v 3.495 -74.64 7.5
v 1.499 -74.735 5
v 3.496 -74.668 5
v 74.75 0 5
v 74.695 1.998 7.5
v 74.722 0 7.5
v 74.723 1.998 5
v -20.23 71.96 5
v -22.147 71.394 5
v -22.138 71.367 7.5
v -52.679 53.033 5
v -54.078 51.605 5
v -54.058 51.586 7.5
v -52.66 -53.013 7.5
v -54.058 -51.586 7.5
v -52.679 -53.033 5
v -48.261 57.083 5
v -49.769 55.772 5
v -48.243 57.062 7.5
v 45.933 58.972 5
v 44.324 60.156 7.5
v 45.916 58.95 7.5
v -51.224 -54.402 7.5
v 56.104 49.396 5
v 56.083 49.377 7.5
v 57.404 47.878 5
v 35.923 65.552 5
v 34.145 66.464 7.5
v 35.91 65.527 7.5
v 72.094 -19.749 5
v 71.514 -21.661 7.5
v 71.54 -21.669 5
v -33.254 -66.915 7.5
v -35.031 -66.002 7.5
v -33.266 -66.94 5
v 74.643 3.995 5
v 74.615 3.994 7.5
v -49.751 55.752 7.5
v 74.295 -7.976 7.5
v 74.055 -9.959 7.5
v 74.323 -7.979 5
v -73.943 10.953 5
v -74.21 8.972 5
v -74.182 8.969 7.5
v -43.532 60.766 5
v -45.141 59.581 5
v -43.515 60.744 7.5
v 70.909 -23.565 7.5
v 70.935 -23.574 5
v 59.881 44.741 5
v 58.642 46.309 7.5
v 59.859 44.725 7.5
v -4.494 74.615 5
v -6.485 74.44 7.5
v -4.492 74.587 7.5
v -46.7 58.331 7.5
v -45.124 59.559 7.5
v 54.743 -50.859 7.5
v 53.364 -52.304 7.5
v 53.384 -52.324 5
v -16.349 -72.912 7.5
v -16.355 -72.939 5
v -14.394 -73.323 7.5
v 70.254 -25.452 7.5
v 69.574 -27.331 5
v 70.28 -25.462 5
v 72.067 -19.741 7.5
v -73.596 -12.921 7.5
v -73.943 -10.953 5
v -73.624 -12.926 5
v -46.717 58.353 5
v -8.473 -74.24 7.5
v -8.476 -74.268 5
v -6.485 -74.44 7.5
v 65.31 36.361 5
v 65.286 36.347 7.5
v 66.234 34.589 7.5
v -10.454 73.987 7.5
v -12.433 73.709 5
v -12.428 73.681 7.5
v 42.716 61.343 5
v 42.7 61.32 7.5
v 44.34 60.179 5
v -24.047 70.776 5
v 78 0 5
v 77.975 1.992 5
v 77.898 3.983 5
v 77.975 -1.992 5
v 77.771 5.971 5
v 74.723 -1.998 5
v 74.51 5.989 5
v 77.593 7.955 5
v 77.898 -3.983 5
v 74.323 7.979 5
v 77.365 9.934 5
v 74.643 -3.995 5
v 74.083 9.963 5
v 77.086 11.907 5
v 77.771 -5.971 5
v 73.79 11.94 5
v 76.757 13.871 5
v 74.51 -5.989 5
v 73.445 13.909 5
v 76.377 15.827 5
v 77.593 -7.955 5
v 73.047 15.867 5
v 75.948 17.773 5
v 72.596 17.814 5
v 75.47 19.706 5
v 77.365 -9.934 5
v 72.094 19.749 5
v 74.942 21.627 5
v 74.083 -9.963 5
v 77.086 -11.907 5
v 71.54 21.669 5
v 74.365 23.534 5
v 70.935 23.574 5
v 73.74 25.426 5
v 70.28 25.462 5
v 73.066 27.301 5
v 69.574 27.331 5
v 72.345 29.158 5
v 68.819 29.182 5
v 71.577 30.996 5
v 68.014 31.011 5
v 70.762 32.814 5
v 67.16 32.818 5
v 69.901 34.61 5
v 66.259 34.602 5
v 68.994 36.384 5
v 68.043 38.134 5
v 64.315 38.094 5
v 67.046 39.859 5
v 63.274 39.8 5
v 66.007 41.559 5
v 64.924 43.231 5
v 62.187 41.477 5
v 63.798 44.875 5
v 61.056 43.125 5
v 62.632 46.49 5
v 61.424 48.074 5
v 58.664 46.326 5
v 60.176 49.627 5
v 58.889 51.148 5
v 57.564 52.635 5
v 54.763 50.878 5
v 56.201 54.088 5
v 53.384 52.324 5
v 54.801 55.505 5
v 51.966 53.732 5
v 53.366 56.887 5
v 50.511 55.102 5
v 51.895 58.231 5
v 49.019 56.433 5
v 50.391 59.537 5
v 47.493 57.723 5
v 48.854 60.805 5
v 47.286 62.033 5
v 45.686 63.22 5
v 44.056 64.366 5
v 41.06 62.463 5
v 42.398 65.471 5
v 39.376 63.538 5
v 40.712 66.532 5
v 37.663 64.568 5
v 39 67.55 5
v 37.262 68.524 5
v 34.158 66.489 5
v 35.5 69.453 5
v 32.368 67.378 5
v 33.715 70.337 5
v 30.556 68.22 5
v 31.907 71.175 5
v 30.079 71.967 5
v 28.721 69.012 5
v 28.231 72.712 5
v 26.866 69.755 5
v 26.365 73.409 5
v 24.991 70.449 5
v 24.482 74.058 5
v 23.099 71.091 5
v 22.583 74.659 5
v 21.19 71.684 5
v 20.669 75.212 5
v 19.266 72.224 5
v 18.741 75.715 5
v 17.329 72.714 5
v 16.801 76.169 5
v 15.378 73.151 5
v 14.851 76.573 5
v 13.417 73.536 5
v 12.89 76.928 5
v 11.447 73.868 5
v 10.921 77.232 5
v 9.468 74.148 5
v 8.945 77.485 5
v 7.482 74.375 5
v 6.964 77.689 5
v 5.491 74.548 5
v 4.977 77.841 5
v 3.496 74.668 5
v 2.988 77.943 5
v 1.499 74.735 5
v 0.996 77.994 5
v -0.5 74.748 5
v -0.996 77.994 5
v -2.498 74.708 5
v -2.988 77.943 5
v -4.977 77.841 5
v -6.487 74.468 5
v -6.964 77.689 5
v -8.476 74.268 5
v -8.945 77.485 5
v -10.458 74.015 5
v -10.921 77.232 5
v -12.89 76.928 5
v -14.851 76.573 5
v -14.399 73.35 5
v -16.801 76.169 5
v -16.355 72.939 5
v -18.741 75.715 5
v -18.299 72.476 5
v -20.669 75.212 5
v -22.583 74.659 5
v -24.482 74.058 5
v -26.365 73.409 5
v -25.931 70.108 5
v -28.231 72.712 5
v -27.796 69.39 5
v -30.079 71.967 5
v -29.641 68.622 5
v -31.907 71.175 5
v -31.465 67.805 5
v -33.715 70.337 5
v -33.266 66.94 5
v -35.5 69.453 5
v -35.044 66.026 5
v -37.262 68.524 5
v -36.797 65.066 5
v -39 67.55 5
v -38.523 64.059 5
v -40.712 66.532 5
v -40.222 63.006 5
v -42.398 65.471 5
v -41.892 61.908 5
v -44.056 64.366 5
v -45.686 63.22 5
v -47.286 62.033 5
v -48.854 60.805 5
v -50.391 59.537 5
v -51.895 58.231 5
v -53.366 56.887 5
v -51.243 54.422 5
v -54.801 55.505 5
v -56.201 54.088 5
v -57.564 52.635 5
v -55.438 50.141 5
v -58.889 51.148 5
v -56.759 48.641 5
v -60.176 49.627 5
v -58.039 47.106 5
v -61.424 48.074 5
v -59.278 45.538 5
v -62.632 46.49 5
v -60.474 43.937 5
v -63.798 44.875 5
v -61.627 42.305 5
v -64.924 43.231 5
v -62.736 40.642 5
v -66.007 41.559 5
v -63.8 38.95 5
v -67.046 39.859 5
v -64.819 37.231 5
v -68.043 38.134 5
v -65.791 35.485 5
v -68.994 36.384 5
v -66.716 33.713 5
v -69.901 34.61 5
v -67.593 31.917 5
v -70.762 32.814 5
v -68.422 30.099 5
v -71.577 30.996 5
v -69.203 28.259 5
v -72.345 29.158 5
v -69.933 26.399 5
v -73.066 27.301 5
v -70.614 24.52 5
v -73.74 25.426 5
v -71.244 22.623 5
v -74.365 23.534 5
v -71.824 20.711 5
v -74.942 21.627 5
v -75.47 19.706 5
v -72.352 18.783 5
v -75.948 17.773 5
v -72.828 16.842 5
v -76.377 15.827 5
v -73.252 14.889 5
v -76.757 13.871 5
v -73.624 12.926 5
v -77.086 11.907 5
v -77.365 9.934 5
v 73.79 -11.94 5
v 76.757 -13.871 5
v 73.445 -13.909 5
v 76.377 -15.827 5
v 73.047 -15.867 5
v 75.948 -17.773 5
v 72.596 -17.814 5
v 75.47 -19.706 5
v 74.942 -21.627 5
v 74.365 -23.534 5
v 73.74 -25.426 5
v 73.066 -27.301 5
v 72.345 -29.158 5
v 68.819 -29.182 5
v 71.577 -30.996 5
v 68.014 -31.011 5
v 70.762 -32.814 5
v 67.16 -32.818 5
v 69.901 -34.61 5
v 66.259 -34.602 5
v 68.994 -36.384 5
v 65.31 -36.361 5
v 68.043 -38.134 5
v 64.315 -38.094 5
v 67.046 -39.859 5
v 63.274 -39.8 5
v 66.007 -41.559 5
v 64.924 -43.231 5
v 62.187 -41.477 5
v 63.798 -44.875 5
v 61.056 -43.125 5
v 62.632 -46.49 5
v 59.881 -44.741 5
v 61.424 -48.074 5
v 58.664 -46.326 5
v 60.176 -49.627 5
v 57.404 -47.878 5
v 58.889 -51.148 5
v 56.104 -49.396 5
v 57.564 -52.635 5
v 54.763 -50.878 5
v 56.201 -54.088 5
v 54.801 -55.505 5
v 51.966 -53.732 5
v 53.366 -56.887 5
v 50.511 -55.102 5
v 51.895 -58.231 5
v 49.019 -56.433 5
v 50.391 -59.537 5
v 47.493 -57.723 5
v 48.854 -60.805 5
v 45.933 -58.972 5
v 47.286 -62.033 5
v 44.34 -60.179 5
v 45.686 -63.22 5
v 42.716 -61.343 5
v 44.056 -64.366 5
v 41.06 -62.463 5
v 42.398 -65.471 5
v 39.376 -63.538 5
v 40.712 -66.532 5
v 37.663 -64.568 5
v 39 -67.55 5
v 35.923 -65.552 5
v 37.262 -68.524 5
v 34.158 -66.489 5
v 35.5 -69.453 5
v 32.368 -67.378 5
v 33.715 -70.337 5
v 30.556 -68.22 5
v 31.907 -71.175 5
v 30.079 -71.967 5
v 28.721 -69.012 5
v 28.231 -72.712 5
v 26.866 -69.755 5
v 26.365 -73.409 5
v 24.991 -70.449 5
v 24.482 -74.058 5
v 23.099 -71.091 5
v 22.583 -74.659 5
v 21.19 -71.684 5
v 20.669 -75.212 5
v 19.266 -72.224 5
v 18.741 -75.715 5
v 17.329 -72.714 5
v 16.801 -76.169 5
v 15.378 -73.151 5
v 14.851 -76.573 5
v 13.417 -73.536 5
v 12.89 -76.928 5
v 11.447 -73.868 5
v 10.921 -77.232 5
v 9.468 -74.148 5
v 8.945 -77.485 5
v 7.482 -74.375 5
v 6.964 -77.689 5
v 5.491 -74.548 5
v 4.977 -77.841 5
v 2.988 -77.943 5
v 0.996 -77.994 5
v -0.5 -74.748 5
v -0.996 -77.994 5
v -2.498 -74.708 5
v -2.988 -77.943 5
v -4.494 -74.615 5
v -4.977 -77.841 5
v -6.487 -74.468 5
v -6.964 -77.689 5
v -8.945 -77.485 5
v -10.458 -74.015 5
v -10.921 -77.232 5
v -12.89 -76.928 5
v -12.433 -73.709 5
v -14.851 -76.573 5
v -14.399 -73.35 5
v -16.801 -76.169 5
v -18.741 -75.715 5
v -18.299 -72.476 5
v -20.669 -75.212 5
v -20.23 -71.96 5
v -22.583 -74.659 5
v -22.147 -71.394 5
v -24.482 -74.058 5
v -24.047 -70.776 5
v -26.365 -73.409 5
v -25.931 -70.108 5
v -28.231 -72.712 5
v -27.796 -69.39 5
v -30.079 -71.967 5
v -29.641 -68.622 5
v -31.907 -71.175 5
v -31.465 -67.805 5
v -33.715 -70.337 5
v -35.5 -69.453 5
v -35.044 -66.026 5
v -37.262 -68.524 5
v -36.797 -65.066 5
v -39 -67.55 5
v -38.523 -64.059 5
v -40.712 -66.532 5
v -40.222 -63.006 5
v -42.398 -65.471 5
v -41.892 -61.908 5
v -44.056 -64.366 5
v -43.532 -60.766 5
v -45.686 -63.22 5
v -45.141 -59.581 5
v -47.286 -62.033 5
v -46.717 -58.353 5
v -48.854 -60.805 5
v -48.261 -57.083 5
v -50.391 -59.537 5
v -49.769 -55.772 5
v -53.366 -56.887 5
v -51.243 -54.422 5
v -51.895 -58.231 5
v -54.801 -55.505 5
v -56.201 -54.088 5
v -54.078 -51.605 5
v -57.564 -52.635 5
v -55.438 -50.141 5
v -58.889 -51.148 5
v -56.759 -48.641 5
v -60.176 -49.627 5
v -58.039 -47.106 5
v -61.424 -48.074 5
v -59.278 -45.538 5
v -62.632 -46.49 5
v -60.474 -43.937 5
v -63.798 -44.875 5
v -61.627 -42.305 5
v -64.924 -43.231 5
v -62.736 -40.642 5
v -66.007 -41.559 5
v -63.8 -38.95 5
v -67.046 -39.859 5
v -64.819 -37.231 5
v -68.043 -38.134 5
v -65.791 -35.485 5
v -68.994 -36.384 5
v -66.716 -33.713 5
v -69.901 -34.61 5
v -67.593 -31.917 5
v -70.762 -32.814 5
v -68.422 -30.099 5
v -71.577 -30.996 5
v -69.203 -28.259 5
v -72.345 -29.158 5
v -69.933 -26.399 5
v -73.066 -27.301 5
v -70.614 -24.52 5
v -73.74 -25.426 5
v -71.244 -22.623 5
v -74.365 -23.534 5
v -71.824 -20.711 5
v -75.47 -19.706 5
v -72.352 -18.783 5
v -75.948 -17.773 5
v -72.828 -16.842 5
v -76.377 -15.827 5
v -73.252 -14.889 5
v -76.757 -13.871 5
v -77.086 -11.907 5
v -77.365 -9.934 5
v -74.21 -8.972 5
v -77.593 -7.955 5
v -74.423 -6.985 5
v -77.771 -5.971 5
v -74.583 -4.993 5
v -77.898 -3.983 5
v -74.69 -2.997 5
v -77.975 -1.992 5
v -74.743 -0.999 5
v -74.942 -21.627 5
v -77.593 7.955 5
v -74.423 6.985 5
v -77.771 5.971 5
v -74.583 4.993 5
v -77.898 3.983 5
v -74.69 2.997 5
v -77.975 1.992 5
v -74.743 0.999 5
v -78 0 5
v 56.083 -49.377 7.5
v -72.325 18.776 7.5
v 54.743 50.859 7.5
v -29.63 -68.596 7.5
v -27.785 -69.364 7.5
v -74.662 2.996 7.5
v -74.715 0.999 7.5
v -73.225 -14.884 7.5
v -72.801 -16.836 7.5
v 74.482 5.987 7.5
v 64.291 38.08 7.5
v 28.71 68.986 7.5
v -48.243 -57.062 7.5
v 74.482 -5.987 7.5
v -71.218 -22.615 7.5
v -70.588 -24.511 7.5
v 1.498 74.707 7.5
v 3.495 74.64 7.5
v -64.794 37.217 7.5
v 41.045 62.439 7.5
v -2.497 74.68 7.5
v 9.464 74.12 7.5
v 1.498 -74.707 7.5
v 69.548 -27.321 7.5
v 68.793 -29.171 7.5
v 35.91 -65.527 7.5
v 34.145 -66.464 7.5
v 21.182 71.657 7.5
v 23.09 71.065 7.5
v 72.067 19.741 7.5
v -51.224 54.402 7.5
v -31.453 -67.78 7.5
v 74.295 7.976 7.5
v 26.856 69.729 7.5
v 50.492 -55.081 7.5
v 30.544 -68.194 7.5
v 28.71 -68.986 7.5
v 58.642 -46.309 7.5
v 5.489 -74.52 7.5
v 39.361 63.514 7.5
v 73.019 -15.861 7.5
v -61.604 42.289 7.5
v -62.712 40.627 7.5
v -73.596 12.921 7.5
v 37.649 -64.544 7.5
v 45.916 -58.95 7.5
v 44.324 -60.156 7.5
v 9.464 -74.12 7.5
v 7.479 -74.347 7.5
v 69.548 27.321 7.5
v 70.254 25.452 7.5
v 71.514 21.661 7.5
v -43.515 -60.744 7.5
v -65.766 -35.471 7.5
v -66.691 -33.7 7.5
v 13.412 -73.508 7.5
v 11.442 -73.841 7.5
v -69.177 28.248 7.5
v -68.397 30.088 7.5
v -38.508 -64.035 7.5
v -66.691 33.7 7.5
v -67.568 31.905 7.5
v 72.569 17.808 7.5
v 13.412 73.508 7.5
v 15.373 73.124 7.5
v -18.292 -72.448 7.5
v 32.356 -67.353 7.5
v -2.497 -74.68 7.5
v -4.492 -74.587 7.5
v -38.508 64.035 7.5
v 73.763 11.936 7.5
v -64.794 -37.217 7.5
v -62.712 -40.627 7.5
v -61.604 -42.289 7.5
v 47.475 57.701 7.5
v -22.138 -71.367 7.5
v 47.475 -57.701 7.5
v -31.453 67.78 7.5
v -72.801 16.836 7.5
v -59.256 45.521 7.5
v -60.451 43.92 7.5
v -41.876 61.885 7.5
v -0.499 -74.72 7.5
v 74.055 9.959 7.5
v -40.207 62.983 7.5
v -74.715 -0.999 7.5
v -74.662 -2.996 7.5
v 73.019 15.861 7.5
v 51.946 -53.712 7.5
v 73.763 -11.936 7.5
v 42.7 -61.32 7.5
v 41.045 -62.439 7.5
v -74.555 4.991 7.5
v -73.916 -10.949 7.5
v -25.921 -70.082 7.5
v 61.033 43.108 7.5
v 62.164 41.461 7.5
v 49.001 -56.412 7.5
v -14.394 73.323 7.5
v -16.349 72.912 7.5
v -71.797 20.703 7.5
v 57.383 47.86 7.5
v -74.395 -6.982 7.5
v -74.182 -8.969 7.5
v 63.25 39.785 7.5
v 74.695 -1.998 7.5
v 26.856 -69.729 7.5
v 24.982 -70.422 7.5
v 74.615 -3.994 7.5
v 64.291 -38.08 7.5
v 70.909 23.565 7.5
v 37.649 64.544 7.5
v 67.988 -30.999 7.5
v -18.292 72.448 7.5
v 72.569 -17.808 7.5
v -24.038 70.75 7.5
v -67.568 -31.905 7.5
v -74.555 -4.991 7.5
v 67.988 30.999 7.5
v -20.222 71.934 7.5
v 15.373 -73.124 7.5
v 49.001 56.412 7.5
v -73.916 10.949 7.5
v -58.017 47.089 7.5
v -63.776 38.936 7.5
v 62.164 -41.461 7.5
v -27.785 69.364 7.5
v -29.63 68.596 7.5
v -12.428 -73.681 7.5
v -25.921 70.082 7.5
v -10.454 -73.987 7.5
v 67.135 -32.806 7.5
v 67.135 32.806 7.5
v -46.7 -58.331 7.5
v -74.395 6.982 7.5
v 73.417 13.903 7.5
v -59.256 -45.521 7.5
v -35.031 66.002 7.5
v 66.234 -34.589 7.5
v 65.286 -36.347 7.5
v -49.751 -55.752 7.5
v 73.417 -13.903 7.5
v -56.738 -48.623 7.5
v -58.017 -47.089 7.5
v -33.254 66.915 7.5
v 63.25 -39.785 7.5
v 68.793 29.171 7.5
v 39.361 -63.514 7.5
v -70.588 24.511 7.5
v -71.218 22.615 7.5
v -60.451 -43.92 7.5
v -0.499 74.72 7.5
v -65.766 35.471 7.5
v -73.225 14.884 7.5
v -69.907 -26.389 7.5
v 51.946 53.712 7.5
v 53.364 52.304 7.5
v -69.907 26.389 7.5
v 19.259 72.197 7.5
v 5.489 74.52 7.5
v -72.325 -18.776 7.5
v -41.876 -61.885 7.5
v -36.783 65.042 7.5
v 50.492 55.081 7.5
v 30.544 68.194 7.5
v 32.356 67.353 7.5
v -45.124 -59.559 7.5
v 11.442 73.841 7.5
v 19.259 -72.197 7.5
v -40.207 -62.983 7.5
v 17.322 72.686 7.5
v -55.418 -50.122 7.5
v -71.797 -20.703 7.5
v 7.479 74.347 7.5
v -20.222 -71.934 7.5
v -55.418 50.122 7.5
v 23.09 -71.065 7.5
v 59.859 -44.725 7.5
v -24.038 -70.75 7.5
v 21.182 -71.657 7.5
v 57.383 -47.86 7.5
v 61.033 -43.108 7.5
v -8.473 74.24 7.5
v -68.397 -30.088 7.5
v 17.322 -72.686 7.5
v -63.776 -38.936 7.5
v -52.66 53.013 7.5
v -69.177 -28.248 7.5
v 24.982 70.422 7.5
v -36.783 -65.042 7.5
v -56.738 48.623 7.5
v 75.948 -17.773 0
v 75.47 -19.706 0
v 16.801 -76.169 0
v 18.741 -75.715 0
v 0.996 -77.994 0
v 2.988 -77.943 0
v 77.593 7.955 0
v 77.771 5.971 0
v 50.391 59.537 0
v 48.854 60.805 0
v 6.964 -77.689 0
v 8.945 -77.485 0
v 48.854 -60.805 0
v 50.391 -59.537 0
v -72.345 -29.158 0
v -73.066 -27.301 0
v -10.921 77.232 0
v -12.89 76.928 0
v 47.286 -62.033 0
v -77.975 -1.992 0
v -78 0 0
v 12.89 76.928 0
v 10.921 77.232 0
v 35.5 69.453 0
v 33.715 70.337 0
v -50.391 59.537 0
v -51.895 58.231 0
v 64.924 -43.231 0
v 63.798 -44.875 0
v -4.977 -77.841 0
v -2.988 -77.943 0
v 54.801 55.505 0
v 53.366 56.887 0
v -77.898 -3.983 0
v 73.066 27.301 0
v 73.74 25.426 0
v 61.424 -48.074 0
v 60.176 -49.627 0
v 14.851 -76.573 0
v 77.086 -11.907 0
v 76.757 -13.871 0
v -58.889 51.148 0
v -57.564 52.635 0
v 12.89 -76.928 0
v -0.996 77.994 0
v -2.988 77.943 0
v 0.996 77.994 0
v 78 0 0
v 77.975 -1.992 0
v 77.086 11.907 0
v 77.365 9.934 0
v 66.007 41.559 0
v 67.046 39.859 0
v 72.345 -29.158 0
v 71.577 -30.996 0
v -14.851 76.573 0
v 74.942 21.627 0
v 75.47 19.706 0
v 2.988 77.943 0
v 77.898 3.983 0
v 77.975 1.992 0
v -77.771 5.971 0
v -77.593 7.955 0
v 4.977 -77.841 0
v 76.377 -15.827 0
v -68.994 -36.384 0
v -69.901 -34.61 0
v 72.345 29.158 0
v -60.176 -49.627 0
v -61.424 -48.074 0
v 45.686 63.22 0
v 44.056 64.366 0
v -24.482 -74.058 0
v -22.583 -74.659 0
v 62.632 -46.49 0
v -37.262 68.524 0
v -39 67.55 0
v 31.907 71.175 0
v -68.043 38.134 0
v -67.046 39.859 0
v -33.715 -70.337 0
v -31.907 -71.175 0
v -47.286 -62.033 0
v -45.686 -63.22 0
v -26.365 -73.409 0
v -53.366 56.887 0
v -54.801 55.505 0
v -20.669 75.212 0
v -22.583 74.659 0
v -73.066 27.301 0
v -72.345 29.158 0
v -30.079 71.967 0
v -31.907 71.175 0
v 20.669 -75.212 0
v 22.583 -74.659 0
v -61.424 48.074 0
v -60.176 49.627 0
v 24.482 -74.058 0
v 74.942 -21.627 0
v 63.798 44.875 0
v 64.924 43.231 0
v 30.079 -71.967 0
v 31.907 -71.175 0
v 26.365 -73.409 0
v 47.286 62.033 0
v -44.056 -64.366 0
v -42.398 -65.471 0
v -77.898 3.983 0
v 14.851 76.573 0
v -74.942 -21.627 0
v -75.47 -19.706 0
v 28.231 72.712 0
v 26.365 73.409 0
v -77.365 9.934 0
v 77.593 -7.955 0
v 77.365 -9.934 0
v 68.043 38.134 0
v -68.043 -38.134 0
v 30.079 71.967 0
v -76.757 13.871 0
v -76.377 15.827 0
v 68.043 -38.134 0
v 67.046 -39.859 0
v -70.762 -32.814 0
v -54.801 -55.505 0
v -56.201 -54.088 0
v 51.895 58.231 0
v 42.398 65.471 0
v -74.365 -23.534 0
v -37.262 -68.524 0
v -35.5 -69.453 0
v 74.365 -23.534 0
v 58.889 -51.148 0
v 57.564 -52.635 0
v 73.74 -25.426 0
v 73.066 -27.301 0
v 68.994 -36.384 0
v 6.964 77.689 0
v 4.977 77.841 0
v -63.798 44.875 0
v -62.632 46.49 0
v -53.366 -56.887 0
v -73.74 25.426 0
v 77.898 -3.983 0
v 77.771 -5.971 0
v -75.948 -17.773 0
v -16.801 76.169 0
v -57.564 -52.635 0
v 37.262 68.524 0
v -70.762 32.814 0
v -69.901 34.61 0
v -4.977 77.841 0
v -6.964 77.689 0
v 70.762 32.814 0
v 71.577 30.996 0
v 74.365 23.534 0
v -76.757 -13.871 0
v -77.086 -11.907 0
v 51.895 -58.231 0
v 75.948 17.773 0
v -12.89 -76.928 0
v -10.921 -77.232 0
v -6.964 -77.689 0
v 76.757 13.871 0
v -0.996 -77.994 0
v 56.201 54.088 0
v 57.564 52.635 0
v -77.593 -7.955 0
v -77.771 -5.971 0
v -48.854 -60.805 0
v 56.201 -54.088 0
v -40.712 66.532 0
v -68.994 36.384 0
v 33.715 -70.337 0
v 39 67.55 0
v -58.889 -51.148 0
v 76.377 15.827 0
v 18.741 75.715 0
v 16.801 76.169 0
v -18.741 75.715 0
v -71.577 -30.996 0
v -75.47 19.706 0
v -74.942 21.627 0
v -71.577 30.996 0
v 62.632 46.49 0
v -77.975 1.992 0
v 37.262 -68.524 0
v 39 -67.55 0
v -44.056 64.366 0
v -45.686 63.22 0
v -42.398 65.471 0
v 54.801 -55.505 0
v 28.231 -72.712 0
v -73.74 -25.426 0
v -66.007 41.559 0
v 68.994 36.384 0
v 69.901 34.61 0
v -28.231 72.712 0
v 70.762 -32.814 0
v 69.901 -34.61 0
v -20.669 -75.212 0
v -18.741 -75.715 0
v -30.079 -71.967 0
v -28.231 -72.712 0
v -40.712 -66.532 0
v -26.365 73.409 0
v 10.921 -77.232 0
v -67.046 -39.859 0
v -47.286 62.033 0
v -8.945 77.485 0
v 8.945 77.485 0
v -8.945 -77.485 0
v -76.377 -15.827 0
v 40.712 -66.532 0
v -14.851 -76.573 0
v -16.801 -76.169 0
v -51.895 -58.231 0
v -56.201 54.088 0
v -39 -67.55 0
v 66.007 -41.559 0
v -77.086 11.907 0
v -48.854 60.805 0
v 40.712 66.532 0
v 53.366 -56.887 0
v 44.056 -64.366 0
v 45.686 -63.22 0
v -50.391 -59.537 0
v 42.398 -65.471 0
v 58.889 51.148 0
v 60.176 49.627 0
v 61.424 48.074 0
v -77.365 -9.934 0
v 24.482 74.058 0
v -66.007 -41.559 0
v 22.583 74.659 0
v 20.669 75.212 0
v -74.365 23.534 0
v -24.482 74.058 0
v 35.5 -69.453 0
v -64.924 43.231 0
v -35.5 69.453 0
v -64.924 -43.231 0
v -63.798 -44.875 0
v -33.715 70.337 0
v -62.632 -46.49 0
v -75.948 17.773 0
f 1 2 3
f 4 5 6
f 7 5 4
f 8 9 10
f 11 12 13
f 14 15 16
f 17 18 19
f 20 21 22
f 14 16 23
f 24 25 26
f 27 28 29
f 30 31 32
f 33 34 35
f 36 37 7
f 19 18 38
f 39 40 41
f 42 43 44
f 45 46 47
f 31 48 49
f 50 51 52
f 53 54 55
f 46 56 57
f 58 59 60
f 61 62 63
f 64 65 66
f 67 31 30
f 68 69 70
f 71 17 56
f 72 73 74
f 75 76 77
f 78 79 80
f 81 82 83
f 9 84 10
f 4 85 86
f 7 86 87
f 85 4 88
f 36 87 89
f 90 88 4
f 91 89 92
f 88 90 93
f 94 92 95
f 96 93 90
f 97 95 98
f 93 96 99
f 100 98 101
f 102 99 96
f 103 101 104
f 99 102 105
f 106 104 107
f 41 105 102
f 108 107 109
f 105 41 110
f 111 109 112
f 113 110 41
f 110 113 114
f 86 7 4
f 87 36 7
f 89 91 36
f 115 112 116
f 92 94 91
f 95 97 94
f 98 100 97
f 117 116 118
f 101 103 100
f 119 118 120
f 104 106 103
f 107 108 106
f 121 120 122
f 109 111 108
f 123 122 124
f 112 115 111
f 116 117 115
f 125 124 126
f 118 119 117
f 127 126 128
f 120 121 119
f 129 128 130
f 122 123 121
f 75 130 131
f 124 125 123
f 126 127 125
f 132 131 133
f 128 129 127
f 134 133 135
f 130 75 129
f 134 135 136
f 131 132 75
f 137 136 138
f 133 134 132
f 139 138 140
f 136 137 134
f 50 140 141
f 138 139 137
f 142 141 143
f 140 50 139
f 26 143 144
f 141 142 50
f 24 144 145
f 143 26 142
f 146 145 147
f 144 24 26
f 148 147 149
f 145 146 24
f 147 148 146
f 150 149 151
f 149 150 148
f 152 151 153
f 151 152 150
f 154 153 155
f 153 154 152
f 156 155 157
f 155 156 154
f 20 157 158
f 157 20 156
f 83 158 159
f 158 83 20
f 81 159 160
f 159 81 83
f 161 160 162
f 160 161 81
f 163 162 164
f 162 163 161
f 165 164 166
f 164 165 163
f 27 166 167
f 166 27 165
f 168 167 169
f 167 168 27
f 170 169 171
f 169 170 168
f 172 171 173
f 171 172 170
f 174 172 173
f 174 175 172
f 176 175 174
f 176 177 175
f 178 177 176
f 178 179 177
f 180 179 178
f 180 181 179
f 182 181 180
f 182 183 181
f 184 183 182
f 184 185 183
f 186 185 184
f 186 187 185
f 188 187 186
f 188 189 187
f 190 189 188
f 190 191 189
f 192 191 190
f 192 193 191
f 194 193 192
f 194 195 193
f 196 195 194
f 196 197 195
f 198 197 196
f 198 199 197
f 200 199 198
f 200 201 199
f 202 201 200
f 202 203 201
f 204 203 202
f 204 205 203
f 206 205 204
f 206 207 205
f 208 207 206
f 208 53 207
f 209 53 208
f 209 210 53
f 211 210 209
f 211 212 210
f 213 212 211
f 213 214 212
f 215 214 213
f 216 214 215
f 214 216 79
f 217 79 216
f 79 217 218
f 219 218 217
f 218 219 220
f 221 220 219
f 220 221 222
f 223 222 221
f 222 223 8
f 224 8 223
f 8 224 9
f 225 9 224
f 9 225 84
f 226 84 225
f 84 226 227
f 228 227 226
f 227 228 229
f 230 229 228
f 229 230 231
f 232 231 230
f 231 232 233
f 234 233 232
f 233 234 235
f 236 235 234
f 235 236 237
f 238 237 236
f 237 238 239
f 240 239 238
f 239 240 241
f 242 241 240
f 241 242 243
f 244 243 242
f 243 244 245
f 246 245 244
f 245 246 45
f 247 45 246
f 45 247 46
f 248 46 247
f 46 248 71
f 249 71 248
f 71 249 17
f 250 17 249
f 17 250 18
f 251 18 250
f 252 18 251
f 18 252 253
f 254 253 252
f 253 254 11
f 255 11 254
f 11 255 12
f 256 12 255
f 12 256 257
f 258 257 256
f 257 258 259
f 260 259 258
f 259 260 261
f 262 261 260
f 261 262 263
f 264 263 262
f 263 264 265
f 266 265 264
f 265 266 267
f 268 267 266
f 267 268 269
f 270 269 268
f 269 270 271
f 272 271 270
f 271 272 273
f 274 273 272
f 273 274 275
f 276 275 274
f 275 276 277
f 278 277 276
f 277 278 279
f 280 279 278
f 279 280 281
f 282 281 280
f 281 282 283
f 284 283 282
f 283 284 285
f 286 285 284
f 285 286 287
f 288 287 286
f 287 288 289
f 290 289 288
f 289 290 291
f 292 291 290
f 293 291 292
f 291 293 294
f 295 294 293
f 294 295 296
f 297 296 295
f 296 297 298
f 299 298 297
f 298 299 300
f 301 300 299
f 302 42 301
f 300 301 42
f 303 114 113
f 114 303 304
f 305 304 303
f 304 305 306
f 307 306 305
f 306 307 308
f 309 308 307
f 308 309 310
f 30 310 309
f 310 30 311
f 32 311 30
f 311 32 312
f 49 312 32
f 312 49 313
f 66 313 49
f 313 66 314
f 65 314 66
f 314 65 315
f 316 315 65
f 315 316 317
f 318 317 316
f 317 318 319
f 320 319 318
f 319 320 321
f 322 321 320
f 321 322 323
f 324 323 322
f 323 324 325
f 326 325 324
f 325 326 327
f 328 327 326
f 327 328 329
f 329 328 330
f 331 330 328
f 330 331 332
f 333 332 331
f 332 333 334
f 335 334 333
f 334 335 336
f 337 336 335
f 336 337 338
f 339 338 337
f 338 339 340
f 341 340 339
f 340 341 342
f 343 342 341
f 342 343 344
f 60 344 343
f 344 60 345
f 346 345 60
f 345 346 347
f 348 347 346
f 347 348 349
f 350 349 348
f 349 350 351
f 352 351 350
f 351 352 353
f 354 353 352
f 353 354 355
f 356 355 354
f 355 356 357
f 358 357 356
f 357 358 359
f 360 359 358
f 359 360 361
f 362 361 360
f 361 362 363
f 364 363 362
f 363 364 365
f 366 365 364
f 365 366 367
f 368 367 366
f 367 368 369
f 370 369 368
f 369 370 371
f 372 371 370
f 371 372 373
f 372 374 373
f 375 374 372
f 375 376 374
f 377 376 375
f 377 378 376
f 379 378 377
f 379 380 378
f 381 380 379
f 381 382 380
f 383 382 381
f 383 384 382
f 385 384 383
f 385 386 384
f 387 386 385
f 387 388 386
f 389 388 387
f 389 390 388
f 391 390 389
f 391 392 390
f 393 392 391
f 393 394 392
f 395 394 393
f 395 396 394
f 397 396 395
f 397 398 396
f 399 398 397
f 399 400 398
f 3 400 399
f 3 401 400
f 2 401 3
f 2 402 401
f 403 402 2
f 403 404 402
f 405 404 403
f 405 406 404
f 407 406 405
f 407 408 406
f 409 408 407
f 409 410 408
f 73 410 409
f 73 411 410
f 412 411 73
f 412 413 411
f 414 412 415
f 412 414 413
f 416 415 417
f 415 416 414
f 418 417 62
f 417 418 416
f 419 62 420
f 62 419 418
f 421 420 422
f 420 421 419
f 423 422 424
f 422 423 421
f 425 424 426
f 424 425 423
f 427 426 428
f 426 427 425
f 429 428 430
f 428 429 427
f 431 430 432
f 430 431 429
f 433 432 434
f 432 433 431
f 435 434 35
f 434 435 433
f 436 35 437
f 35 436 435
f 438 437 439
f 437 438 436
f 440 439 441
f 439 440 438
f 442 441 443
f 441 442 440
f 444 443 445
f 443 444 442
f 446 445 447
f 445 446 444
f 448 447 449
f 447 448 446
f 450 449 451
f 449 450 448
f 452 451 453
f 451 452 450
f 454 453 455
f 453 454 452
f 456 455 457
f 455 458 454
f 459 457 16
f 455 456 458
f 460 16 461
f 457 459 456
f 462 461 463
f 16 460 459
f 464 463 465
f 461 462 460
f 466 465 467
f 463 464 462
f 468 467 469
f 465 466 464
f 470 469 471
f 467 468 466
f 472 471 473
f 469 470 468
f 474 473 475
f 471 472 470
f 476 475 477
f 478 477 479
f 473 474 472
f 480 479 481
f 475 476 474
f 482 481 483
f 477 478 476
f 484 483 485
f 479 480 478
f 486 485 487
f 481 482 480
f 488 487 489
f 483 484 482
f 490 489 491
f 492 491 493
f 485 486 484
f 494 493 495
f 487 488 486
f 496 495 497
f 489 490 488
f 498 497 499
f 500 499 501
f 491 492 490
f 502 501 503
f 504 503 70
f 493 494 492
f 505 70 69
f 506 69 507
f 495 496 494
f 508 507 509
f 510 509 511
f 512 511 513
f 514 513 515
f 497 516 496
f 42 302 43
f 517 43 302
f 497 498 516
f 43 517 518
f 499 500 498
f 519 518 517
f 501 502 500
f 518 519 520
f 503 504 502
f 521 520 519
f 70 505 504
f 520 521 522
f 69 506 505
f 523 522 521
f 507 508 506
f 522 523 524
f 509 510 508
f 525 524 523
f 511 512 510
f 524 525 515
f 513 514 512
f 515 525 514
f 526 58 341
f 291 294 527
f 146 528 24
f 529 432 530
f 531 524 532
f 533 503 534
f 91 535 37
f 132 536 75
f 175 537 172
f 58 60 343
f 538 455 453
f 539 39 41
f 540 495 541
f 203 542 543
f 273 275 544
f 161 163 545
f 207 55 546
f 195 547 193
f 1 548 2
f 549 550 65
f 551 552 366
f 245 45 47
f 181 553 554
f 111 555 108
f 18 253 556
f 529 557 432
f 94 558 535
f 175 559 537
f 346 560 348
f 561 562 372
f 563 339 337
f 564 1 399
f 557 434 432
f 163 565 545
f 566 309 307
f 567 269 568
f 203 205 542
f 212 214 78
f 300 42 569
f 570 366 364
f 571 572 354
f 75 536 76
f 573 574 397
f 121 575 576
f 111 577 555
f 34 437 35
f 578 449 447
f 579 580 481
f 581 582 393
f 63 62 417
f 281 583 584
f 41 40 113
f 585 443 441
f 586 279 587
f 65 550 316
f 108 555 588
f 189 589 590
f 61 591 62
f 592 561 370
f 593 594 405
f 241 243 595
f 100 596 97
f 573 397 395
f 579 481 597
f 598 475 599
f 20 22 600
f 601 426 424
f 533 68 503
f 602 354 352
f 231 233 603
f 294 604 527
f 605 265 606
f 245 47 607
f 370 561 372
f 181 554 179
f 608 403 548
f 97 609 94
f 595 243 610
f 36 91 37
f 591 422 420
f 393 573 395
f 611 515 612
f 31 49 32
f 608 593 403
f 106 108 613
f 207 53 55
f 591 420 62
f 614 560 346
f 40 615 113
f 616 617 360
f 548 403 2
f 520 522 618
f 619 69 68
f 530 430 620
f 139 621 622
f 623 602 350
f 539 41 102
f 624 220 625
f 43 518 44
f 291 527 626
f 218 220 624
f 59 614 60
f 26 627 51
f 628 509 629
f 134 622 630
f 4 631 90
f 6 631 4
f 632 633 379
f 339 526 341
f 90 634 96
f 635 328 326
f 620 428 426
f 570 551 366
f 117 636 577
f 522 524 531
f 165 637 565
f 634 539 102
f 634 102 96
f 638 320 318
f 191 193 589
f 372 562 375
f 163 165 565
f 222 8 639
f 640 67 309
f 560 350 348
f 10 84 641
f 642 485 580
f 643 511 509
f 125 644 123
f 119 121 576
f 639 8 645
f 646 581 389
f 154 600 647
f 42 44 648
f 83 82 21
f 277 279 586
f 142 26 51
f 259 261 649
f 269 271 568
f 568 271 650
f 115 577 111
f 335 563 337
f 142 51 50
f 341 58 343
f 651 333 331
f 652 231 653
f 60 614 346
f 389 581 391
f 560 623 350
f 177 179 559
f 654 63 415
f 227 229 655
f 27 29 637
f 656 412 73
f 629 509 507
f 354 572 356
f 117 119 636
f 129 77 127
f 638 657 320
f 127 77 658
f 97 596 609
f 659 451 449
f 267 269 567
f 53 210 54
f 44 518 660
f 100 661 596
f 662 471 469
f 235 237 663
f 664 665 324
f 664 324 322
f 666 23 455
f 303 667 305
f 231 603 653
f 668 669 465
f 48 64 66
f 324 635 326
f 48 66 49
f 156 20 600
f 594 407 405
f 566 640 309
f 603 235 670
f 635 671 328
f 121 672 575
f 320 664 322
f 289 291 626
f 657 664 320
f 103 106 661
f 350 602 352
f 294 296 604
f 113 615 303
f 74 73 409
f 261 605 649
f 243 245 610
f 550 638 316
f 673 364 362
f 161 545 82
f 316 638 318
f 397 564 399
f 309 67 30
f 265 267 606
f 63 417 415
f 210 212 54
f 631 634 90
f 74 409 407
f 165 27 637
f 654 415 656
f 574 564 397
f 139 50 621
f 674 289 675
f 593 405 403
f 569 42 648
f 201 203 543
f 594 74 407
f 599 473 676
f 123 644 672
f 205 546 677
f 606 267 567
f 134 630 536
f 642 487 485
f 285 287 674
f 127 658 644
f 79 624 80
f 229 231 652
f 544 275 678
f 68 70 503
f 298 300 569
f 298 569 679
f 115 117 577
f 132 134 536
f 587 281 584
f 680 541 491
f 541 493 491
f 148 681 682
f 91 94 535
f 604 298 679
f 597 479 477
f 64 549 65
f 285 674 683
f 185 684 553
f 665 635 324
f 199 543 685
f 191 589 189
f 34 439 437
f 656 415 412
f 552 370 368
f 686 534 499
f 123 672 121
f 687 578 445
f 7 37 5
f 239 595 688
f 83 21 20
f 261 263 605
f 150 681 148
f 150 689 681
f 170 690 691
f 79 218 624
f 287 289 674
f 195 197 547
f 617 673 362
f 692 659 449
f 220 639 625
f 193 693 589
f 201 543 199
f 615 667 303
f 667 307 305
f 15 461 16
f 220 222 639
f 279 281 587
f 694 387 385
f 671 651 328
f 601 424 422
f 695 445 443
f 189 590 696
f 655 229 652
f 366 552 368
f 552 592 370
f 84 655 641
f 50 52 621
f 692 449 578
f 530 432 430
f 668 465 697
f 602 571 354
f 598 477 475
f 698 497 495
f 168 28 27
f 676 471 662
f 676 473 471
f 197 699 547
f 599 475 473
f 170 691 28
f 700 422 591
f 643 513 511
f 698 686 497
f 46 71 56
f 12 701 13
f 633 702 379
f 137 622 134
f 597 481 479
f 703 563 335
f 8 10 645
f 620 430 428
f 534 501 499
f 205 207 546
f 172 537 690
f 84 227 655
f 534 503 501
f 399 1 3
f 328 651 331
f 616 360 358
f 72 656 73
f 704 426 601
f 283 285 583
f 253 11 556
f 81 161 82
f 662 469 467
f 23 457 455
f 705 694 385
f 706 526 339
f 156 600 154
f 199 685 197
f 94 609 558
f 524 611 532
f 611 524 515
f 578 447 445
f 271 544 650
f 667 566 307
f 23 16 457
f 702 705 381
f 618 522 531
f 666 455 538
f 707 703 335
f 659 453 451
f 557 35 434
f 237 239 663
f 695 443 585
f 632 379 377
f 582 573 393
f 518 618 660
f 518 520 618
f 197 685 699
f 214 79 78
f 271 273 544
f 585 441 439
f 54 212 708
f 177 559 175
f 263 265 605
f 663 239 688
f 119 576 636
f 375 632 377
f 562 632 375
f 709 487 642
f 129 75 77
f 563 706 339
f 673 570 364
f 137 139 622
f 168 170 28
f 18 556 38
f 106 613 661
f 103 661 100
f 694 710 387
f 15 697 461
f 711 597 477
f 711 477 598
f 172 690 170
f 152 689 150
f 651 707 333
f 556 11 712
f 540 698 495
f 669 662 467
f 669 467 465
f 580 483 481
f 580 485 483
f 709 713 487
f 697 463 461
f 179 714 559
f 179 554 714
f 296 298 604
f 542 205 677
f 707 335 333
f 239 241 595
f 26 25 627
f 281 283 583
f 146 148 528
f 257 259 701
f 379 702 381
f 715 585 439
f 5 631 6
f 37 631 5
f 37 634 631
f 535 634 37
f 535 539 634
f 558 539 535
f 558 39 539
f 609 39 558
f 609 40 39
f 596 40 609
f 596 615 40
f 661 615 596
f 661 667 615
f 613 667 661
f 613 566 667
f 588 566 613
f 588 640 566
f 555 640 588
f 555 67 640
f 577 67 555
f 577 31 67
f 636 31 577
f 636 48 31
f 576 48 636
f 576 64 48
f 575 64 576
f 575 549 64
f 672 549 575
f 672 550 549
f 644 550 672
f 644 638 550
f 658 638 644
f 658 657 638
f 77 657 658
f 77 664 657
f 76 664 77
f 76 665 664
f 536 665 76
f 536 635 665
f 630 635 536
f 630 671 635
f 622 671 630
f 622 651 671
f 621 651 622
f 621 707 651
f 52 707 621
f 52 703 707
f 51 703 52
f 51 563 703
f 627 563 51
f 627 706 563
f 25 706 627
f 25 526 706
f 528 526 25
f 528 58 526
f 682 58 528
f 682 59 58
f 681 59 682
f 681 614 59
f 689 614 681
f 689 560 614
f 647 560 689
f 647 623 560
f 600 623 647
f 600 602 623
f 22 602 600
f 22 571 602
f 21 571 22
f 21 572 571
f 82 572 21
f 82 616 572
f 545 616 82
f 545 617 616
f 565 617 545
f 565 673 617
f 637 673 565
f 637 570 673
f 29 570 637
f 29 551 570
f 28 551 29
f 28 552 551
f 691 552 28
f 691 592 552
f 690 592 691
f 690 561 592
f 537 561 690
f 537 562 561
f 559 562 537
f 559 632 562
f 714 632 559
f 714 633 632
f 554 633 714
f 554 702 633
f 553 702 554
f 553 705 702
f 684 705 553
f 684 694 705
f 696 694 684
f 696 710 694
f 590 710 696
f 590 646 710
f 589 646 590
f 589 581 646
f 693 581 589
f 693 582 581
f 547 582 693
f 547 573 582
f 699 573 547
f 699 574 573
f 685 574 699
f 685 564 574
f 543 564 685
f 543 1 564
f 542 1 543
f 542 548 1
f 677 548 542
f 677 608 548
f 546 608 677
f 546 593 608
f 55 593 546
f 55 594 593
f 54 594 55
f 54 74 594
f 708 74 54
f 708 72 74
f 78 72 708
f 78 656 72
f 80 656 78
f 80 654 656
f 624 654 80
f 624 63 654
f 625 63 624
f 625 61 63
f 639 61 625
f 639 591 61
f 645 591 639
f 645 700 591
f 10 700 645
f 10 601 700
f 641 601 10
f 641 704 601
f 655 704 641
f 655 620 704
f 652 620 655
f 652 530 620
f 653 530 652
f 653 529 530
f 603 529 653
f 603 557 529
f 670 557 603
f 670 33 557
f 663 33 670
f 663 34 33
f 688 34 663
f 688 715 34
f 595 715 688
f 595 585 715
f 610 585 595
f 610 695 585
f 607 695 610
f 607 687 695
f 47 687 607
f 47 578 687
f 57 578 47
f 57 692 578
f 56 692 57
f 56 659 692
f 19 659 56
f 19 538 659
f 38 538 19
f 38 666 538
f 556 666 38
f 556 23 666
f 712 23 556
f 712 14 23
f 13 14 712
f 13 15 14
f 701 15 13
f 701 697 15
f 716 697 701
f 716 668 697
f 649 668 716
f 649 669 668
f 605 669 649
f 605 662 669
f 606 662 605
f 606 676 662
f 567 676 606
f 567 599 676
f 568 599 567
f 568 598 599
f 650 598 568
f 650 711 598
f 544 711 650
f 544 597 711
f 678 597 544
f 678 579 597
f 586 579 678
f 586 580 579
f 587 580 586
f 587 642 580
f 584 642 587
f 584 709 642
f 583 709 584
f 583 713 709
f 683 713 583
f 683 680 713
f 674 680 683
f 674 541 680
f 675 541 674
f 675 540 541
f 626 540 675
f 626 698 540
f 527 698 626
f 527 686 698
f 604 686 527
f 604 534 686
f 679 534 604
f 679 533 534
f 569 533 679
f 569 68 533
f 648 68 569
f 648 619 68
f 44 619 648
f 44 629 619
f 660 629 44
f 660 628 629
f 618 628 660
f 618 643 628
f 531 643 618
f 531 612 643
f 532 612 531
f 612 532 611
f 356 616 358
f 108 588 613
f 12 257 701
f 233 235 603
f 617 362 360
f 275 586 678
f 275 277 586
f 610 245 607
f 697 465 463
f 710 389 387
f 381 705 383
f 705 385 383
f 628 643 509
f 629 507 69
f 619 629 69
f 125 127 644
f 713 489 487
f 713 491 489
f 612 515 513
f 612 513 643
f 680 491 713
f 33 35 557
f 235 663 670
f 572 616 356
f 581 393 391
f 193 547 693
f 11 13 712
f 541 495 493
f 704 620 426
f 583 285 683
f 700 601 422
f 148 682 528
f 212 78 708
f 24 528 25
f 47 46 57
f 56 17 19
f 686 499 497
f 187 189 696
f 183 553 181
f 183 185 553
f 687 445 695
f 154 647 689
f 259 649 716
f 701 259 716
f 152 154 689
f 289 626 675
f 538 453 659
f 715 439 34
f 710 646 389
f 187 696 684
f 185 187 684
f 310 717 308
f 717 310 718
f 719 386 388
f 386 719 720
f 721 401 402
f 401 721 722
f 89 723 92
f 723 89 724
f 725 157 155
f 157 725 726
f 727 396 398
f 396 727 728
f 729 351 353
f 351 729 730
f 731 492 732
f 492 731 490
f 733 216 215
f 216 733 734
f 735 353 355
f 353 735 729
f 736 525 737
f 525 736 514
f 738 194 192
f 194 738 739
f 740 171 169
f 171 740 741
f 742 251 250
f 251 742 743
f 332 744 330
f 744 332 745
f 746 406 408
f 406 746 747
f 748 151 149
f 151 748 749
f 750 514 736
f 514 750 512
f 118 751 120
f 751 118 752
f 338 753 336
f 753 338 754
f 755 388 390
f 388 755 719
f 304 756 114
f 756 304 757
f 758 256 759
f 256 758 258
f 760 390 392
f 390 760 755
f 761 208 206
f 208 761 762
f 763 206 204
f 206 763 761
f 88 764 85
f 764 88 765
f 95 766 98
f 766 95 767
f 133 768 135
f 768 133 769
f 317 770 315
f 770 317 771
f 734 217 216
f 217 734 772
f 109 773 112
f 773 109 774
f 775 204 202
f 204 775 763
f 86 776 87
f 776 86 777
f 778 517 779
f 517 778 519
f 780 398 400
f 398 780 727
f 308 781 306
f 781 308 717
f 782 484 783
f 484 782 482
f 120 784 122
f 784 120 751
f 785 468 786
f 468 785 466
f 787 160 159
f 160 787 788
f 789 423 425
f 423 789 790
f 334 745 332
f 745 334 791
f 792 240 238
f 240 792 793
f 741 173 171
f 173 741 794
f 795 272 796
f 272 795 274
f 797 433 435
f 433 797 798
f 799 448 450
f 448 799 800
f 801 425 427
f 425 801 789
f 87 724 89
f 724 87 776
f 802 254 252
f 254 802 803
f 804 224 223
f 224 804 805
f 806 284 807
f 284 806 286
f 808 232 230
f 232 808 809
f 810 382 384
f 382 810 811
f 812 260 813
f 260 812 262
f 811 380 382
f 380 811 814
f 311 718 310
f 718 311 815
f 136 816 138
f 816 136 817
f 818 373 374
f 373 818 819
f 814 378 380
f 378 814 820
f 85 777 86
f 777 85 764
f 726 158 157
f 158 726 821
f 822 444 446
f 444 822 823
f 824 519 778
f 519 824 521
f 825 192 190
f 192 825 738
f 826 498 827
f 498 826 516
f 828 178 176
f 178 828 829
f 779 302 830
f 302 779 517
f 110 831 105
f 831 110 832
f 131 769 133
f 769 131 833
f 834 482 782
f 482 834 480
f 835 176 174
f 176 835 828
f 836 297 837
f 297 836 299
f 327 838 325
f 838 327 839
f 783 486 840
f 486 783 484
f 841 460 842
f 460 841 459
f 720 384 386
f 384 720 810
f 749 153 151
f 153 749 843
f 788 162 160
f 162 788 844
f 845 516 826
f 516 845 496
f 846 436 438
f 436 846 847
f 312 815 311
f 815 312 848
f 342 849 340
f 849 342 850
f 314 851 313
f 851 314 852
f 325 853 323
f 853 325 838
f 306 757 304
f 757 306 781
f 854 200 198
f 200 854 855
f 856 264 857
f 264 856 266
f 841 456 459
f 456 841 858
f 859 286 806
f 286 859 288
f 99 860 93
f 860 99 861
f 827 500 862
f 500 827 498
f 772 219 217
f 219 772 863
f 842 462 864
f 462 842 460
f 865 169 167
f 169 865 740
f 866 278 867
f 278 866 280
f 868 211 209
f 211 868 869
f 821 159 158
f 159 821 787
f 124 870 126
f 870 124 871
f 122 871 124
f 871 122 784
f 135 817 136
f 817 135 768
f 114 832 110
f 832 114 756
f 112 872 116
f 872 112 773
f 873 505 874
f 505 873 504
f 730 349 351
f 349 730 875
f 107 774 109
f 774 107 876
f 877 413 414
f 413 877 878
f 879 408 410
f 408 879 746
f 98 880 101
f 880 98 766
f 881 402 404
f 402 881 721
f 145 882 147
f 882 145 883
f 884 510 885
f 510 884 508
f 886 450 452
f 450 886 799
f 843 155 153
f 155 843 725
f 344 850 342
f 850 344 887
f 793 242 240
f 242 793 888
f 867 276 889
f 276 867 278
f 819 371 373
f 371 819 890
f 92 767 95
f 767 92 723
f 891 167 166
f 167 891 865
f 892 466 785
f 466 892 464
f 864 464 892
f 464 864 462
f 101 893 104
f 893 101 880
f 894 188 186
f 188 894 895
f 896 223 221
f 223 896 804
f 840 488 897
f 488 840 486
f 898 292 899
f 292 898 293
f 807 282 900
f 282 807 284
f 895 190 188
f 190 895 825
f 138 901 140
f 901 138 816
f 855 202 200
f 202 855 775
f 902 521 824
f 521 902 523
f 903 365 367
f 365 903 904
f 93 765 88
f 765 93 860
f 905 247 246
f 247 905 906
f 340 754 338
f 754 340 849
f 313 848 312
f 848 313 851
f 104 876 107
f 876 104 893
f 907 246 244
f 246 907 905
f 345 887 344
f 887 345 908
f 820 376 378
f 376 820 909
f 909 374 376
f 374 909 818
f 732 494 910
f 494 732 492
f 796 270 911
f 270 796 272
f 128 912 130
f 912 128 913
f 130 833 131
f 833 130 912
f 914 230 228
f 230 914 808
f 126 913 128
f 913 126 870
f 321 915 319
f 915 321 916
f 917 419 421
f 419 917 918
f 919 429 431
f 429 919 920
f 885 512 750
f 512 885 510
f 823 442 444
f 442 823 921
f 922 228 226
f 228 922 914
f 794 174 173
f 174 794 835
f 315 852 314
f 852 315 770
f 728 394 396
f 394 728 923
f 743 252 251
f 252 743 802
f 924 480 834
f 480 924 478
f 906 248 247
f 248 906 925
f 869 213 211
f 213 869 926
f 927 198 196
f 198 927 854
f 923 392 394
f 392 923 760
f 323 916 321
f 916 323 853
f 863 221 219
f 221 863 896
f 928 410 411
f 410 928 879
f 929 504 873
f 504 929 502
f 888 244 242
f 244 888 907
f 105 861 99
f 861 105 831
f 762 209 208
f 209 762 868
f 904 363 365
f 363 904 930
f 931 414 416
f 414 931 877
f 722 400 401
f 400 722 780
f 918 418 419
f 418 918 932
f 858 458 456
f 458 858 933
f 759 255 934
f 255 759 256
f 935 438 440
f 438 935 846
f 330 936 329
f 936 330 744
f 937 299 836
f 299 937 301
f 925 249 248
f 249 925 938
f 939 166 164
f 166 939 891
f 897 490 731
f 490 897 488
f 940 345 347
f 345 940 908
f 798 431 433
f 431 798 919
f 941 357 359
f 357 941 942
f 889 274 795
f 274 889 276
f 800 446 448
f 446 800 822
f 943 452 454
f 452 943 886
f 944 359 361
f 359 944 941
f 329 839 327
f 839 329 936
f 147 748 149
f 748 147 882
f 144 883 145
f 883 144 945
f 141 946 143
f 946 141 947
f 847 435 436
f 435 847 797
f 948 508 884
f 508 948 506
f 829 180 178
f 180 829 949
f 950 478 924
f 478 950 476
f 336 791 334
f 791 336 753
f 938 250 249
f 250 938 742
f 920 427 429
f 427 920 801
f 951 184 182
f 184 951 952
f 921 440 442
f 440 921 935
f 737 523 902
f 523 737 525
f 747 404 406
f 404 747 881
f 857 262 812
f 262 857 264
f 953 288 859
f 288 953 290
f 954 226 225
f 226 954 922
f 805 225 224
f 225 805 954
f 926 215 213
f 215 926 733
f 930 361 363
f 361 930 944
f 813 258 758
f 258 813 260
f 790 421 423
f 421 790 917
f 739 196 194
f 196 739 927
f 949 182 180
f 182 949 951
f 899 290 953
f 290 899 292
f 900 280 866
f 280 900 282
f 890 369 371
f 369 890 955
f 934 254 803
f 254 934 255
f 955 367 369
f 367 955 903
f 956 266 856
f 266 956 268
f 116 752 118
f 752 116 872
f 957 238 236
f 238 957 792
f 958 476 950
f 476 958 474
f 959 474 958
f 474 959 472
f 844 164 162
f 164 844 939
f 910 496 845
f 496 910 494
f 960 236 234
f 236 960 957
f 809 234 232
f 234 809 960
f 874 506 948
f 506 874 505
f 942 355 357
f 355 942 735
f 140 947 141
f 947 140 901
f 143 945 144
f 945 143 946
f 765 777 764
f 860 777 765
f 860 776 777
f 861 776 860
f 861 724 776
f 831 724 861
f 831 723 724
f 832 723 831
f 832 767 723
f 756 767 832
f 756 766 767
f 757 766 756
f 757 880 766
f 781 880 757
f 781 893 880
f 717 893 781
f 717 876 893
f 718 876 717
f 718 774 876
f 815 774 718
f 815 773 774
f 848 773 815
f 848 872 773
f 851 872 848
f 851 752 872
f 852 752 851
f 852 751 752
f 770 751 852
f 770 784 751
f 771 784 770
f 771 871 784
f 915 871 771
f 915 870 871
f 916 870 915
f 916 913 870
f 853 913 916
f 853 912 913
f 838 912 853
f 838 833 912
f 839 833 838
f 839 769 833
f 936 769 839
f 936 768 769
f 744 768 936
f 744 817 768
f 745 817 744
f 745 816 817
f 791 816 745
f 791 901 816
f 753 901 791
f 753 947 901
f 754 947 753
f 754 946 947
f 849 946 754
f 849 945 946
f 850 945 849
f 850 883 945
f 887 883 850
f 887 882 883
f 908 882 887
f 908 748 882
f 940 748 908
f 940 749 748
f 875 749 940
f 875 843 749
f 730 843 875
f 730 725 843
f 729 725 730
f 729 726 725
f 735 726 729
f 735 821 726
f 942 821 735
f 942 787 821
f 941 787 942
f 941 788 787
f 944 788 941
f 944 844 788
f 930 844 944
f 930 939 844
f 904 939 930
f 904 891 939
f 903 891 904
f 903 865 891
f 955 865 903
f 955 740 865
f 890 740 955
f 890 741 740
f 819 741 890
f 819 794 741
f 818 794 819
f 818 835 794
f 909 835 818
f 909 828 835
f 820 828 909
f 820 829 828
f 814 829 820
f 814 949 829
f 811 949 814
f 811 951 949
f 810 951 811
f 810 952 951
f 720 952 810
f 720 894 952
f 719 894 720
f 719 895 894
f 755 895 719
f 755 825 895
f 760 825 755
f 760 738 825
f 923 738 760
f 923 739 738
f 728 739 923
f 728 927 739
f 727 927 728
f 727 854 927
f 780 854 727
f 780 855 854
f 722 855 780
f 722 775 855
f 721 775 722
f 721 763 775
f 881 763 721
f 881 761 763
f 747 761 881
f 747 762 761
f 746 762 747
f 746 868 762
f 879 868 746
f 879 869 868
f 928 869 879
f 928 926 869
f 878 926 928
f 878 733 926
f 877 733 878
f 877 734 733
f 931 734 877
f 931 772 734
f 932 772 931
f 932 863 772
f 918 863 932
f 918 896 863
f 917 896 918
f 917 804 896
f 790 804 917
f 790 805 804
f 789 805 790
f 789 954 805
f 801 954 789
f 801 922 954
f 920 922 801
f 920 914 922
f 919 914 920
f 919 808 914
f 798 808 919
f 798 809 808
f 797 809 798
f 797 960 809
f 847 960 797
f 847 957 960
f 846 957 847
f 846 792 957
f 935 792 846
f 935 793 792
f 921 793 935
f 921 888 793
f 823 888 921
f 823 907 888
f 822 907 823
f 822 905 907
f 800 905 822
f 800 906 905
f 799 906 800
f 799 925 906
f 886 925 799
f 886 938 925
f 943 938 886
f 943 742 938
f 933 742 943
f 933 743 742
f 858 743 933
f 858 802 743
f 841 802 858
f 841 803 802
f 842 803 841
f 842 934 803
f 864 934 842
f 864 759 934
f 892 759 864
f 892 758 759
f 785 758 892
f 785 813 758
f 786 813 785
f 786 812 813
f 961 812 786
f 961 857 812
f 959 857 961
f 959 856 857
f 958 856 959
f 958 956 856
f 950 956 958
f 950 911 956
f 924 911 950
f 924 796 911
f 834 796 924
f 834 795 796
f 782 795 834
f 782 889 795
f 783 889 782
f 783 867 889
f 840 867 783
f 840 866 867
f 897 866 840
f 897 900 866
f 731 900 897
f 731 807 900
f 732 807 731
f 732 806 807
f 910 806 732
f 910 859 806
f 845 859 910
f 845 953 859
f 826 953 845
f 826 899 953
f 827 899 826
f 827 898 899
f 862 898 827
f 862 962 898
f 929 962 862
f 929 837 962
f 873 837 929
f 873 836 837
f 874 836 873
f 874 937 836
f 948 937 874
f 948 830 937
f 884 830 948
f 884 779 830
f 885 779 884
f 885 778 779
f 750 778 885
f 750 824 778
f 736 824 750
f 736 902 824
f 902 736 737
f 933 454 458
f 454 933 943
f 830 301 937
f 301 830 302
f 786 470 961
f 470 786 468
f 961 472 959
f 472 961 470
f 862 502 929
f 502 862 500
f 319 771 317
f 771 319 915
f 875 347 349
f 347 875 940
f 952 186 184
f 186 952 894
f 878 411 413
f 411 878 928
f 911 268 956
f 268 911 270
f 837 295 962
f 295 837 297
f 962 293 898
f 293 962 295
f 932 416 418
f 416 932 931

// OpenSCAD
/*

      |----id----|   
       |-not id-|          |\
    _   ________           | \
  h1_ _/        \_ <----- h|  \
  h2_|____________|        |   \
                           |____\ <-- theta
     |-----od-----|      h/atan(theta) 
*/
h1 = 2.5;     // mm 
h2 = 2 * h1;
od = 156;     // mm
id = 149.5;   // mm
theta = 85;   // degrees
$fa = 1;

module plug() {
    d_large = id;
    d_small = id - (2 * (h1 / atan(theta)));
    cylinder(h=h1, d1=d_large, d2=d_small);
}

module lid() {
    cylinder(h=h2, d=od);
}

module cap() {
    translate([0, 0, h2]) plug();
    lid();
}

cap();
